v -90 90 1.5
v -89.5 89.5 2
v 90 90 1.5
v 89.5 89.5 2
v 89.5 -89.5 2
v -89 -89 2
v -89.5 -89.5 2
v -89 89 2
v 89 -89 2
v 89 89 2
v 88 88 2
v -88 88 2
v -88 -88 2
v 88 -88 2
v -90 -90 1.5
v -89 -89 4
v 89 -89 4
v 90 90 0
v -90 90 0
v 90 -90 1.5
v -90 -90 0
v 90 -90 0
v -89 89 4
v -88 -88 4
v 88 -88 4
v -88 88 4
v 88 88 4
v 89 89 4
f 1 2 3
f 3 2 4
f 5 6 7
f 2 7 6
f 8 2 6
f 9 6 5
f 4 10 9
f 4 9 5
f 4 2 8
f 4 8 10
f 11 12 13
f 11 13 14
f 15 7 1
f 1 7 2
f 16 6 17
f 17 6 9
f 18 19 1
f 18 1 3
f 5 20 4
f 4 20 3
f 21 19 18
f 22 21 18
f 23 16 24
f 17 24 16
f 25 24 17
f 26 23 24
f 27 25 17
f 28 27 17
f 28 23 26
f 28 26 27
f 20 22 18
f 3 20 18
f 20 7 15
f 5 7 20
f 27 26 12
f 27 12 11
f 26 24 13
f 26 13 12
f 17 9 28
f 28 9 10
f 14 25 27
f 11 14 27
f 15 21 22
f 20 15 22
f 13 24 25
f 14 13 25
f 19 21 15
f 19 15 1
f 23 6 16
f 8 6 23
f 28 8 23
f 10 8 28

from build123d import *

# Parameters (mm, degrees)
SKETCH009_W     = 180
SKETCH009_H     = 180
PAD004_DEPTH    = 2
SKETCH010_W     = 178
SKETCH010_H     = 178
PAD005_DEPTH    = 2
SKETCH011_W     = 176
SKETCH011_H     = 176
POCKET003_DEPTH = 2
CHAMFER004_SIZE = 0.5


with BuildPart() as part:
    # Sketch009 → Pad004 (new body)
    with BuildSketch(Plane.XY):
        Rectangle(SKETCH009_W, SKETCH009_H)
    extrude(amount=PAD004_DEPTH)

    # Sketch010 (on DatumPlane) → Pad005 (join)
    with BuildSketch(Plane.XY.offset(2)):
        Rectangle(SKETCH010_W, SKETCH010_H)
    extrude(amount=PAD005_DEPTH)

    # Sketch011 (on DatumPlane) → Pocket003 (cut)
    with BuildSketch(Plane.XY.offset(4)):
        Rectangle(SKETCH011_W, SKETCH011_H)
    extrude(amount=-POCKET003_DEPTH, mode=Mode.SUBTRACT)

    # Chamfer004
    chamfer004_edges = [part.edges().sort_by_distance(p)[0] for p in [
        (0, -90, 2),
        (0, 90, 2),
        (90, 0, 2),
        (-90, 0, 2),
    ]]
    chamfer(chamfer004_edges, length=CHAMFER004_SIZE)


solid = part.part
